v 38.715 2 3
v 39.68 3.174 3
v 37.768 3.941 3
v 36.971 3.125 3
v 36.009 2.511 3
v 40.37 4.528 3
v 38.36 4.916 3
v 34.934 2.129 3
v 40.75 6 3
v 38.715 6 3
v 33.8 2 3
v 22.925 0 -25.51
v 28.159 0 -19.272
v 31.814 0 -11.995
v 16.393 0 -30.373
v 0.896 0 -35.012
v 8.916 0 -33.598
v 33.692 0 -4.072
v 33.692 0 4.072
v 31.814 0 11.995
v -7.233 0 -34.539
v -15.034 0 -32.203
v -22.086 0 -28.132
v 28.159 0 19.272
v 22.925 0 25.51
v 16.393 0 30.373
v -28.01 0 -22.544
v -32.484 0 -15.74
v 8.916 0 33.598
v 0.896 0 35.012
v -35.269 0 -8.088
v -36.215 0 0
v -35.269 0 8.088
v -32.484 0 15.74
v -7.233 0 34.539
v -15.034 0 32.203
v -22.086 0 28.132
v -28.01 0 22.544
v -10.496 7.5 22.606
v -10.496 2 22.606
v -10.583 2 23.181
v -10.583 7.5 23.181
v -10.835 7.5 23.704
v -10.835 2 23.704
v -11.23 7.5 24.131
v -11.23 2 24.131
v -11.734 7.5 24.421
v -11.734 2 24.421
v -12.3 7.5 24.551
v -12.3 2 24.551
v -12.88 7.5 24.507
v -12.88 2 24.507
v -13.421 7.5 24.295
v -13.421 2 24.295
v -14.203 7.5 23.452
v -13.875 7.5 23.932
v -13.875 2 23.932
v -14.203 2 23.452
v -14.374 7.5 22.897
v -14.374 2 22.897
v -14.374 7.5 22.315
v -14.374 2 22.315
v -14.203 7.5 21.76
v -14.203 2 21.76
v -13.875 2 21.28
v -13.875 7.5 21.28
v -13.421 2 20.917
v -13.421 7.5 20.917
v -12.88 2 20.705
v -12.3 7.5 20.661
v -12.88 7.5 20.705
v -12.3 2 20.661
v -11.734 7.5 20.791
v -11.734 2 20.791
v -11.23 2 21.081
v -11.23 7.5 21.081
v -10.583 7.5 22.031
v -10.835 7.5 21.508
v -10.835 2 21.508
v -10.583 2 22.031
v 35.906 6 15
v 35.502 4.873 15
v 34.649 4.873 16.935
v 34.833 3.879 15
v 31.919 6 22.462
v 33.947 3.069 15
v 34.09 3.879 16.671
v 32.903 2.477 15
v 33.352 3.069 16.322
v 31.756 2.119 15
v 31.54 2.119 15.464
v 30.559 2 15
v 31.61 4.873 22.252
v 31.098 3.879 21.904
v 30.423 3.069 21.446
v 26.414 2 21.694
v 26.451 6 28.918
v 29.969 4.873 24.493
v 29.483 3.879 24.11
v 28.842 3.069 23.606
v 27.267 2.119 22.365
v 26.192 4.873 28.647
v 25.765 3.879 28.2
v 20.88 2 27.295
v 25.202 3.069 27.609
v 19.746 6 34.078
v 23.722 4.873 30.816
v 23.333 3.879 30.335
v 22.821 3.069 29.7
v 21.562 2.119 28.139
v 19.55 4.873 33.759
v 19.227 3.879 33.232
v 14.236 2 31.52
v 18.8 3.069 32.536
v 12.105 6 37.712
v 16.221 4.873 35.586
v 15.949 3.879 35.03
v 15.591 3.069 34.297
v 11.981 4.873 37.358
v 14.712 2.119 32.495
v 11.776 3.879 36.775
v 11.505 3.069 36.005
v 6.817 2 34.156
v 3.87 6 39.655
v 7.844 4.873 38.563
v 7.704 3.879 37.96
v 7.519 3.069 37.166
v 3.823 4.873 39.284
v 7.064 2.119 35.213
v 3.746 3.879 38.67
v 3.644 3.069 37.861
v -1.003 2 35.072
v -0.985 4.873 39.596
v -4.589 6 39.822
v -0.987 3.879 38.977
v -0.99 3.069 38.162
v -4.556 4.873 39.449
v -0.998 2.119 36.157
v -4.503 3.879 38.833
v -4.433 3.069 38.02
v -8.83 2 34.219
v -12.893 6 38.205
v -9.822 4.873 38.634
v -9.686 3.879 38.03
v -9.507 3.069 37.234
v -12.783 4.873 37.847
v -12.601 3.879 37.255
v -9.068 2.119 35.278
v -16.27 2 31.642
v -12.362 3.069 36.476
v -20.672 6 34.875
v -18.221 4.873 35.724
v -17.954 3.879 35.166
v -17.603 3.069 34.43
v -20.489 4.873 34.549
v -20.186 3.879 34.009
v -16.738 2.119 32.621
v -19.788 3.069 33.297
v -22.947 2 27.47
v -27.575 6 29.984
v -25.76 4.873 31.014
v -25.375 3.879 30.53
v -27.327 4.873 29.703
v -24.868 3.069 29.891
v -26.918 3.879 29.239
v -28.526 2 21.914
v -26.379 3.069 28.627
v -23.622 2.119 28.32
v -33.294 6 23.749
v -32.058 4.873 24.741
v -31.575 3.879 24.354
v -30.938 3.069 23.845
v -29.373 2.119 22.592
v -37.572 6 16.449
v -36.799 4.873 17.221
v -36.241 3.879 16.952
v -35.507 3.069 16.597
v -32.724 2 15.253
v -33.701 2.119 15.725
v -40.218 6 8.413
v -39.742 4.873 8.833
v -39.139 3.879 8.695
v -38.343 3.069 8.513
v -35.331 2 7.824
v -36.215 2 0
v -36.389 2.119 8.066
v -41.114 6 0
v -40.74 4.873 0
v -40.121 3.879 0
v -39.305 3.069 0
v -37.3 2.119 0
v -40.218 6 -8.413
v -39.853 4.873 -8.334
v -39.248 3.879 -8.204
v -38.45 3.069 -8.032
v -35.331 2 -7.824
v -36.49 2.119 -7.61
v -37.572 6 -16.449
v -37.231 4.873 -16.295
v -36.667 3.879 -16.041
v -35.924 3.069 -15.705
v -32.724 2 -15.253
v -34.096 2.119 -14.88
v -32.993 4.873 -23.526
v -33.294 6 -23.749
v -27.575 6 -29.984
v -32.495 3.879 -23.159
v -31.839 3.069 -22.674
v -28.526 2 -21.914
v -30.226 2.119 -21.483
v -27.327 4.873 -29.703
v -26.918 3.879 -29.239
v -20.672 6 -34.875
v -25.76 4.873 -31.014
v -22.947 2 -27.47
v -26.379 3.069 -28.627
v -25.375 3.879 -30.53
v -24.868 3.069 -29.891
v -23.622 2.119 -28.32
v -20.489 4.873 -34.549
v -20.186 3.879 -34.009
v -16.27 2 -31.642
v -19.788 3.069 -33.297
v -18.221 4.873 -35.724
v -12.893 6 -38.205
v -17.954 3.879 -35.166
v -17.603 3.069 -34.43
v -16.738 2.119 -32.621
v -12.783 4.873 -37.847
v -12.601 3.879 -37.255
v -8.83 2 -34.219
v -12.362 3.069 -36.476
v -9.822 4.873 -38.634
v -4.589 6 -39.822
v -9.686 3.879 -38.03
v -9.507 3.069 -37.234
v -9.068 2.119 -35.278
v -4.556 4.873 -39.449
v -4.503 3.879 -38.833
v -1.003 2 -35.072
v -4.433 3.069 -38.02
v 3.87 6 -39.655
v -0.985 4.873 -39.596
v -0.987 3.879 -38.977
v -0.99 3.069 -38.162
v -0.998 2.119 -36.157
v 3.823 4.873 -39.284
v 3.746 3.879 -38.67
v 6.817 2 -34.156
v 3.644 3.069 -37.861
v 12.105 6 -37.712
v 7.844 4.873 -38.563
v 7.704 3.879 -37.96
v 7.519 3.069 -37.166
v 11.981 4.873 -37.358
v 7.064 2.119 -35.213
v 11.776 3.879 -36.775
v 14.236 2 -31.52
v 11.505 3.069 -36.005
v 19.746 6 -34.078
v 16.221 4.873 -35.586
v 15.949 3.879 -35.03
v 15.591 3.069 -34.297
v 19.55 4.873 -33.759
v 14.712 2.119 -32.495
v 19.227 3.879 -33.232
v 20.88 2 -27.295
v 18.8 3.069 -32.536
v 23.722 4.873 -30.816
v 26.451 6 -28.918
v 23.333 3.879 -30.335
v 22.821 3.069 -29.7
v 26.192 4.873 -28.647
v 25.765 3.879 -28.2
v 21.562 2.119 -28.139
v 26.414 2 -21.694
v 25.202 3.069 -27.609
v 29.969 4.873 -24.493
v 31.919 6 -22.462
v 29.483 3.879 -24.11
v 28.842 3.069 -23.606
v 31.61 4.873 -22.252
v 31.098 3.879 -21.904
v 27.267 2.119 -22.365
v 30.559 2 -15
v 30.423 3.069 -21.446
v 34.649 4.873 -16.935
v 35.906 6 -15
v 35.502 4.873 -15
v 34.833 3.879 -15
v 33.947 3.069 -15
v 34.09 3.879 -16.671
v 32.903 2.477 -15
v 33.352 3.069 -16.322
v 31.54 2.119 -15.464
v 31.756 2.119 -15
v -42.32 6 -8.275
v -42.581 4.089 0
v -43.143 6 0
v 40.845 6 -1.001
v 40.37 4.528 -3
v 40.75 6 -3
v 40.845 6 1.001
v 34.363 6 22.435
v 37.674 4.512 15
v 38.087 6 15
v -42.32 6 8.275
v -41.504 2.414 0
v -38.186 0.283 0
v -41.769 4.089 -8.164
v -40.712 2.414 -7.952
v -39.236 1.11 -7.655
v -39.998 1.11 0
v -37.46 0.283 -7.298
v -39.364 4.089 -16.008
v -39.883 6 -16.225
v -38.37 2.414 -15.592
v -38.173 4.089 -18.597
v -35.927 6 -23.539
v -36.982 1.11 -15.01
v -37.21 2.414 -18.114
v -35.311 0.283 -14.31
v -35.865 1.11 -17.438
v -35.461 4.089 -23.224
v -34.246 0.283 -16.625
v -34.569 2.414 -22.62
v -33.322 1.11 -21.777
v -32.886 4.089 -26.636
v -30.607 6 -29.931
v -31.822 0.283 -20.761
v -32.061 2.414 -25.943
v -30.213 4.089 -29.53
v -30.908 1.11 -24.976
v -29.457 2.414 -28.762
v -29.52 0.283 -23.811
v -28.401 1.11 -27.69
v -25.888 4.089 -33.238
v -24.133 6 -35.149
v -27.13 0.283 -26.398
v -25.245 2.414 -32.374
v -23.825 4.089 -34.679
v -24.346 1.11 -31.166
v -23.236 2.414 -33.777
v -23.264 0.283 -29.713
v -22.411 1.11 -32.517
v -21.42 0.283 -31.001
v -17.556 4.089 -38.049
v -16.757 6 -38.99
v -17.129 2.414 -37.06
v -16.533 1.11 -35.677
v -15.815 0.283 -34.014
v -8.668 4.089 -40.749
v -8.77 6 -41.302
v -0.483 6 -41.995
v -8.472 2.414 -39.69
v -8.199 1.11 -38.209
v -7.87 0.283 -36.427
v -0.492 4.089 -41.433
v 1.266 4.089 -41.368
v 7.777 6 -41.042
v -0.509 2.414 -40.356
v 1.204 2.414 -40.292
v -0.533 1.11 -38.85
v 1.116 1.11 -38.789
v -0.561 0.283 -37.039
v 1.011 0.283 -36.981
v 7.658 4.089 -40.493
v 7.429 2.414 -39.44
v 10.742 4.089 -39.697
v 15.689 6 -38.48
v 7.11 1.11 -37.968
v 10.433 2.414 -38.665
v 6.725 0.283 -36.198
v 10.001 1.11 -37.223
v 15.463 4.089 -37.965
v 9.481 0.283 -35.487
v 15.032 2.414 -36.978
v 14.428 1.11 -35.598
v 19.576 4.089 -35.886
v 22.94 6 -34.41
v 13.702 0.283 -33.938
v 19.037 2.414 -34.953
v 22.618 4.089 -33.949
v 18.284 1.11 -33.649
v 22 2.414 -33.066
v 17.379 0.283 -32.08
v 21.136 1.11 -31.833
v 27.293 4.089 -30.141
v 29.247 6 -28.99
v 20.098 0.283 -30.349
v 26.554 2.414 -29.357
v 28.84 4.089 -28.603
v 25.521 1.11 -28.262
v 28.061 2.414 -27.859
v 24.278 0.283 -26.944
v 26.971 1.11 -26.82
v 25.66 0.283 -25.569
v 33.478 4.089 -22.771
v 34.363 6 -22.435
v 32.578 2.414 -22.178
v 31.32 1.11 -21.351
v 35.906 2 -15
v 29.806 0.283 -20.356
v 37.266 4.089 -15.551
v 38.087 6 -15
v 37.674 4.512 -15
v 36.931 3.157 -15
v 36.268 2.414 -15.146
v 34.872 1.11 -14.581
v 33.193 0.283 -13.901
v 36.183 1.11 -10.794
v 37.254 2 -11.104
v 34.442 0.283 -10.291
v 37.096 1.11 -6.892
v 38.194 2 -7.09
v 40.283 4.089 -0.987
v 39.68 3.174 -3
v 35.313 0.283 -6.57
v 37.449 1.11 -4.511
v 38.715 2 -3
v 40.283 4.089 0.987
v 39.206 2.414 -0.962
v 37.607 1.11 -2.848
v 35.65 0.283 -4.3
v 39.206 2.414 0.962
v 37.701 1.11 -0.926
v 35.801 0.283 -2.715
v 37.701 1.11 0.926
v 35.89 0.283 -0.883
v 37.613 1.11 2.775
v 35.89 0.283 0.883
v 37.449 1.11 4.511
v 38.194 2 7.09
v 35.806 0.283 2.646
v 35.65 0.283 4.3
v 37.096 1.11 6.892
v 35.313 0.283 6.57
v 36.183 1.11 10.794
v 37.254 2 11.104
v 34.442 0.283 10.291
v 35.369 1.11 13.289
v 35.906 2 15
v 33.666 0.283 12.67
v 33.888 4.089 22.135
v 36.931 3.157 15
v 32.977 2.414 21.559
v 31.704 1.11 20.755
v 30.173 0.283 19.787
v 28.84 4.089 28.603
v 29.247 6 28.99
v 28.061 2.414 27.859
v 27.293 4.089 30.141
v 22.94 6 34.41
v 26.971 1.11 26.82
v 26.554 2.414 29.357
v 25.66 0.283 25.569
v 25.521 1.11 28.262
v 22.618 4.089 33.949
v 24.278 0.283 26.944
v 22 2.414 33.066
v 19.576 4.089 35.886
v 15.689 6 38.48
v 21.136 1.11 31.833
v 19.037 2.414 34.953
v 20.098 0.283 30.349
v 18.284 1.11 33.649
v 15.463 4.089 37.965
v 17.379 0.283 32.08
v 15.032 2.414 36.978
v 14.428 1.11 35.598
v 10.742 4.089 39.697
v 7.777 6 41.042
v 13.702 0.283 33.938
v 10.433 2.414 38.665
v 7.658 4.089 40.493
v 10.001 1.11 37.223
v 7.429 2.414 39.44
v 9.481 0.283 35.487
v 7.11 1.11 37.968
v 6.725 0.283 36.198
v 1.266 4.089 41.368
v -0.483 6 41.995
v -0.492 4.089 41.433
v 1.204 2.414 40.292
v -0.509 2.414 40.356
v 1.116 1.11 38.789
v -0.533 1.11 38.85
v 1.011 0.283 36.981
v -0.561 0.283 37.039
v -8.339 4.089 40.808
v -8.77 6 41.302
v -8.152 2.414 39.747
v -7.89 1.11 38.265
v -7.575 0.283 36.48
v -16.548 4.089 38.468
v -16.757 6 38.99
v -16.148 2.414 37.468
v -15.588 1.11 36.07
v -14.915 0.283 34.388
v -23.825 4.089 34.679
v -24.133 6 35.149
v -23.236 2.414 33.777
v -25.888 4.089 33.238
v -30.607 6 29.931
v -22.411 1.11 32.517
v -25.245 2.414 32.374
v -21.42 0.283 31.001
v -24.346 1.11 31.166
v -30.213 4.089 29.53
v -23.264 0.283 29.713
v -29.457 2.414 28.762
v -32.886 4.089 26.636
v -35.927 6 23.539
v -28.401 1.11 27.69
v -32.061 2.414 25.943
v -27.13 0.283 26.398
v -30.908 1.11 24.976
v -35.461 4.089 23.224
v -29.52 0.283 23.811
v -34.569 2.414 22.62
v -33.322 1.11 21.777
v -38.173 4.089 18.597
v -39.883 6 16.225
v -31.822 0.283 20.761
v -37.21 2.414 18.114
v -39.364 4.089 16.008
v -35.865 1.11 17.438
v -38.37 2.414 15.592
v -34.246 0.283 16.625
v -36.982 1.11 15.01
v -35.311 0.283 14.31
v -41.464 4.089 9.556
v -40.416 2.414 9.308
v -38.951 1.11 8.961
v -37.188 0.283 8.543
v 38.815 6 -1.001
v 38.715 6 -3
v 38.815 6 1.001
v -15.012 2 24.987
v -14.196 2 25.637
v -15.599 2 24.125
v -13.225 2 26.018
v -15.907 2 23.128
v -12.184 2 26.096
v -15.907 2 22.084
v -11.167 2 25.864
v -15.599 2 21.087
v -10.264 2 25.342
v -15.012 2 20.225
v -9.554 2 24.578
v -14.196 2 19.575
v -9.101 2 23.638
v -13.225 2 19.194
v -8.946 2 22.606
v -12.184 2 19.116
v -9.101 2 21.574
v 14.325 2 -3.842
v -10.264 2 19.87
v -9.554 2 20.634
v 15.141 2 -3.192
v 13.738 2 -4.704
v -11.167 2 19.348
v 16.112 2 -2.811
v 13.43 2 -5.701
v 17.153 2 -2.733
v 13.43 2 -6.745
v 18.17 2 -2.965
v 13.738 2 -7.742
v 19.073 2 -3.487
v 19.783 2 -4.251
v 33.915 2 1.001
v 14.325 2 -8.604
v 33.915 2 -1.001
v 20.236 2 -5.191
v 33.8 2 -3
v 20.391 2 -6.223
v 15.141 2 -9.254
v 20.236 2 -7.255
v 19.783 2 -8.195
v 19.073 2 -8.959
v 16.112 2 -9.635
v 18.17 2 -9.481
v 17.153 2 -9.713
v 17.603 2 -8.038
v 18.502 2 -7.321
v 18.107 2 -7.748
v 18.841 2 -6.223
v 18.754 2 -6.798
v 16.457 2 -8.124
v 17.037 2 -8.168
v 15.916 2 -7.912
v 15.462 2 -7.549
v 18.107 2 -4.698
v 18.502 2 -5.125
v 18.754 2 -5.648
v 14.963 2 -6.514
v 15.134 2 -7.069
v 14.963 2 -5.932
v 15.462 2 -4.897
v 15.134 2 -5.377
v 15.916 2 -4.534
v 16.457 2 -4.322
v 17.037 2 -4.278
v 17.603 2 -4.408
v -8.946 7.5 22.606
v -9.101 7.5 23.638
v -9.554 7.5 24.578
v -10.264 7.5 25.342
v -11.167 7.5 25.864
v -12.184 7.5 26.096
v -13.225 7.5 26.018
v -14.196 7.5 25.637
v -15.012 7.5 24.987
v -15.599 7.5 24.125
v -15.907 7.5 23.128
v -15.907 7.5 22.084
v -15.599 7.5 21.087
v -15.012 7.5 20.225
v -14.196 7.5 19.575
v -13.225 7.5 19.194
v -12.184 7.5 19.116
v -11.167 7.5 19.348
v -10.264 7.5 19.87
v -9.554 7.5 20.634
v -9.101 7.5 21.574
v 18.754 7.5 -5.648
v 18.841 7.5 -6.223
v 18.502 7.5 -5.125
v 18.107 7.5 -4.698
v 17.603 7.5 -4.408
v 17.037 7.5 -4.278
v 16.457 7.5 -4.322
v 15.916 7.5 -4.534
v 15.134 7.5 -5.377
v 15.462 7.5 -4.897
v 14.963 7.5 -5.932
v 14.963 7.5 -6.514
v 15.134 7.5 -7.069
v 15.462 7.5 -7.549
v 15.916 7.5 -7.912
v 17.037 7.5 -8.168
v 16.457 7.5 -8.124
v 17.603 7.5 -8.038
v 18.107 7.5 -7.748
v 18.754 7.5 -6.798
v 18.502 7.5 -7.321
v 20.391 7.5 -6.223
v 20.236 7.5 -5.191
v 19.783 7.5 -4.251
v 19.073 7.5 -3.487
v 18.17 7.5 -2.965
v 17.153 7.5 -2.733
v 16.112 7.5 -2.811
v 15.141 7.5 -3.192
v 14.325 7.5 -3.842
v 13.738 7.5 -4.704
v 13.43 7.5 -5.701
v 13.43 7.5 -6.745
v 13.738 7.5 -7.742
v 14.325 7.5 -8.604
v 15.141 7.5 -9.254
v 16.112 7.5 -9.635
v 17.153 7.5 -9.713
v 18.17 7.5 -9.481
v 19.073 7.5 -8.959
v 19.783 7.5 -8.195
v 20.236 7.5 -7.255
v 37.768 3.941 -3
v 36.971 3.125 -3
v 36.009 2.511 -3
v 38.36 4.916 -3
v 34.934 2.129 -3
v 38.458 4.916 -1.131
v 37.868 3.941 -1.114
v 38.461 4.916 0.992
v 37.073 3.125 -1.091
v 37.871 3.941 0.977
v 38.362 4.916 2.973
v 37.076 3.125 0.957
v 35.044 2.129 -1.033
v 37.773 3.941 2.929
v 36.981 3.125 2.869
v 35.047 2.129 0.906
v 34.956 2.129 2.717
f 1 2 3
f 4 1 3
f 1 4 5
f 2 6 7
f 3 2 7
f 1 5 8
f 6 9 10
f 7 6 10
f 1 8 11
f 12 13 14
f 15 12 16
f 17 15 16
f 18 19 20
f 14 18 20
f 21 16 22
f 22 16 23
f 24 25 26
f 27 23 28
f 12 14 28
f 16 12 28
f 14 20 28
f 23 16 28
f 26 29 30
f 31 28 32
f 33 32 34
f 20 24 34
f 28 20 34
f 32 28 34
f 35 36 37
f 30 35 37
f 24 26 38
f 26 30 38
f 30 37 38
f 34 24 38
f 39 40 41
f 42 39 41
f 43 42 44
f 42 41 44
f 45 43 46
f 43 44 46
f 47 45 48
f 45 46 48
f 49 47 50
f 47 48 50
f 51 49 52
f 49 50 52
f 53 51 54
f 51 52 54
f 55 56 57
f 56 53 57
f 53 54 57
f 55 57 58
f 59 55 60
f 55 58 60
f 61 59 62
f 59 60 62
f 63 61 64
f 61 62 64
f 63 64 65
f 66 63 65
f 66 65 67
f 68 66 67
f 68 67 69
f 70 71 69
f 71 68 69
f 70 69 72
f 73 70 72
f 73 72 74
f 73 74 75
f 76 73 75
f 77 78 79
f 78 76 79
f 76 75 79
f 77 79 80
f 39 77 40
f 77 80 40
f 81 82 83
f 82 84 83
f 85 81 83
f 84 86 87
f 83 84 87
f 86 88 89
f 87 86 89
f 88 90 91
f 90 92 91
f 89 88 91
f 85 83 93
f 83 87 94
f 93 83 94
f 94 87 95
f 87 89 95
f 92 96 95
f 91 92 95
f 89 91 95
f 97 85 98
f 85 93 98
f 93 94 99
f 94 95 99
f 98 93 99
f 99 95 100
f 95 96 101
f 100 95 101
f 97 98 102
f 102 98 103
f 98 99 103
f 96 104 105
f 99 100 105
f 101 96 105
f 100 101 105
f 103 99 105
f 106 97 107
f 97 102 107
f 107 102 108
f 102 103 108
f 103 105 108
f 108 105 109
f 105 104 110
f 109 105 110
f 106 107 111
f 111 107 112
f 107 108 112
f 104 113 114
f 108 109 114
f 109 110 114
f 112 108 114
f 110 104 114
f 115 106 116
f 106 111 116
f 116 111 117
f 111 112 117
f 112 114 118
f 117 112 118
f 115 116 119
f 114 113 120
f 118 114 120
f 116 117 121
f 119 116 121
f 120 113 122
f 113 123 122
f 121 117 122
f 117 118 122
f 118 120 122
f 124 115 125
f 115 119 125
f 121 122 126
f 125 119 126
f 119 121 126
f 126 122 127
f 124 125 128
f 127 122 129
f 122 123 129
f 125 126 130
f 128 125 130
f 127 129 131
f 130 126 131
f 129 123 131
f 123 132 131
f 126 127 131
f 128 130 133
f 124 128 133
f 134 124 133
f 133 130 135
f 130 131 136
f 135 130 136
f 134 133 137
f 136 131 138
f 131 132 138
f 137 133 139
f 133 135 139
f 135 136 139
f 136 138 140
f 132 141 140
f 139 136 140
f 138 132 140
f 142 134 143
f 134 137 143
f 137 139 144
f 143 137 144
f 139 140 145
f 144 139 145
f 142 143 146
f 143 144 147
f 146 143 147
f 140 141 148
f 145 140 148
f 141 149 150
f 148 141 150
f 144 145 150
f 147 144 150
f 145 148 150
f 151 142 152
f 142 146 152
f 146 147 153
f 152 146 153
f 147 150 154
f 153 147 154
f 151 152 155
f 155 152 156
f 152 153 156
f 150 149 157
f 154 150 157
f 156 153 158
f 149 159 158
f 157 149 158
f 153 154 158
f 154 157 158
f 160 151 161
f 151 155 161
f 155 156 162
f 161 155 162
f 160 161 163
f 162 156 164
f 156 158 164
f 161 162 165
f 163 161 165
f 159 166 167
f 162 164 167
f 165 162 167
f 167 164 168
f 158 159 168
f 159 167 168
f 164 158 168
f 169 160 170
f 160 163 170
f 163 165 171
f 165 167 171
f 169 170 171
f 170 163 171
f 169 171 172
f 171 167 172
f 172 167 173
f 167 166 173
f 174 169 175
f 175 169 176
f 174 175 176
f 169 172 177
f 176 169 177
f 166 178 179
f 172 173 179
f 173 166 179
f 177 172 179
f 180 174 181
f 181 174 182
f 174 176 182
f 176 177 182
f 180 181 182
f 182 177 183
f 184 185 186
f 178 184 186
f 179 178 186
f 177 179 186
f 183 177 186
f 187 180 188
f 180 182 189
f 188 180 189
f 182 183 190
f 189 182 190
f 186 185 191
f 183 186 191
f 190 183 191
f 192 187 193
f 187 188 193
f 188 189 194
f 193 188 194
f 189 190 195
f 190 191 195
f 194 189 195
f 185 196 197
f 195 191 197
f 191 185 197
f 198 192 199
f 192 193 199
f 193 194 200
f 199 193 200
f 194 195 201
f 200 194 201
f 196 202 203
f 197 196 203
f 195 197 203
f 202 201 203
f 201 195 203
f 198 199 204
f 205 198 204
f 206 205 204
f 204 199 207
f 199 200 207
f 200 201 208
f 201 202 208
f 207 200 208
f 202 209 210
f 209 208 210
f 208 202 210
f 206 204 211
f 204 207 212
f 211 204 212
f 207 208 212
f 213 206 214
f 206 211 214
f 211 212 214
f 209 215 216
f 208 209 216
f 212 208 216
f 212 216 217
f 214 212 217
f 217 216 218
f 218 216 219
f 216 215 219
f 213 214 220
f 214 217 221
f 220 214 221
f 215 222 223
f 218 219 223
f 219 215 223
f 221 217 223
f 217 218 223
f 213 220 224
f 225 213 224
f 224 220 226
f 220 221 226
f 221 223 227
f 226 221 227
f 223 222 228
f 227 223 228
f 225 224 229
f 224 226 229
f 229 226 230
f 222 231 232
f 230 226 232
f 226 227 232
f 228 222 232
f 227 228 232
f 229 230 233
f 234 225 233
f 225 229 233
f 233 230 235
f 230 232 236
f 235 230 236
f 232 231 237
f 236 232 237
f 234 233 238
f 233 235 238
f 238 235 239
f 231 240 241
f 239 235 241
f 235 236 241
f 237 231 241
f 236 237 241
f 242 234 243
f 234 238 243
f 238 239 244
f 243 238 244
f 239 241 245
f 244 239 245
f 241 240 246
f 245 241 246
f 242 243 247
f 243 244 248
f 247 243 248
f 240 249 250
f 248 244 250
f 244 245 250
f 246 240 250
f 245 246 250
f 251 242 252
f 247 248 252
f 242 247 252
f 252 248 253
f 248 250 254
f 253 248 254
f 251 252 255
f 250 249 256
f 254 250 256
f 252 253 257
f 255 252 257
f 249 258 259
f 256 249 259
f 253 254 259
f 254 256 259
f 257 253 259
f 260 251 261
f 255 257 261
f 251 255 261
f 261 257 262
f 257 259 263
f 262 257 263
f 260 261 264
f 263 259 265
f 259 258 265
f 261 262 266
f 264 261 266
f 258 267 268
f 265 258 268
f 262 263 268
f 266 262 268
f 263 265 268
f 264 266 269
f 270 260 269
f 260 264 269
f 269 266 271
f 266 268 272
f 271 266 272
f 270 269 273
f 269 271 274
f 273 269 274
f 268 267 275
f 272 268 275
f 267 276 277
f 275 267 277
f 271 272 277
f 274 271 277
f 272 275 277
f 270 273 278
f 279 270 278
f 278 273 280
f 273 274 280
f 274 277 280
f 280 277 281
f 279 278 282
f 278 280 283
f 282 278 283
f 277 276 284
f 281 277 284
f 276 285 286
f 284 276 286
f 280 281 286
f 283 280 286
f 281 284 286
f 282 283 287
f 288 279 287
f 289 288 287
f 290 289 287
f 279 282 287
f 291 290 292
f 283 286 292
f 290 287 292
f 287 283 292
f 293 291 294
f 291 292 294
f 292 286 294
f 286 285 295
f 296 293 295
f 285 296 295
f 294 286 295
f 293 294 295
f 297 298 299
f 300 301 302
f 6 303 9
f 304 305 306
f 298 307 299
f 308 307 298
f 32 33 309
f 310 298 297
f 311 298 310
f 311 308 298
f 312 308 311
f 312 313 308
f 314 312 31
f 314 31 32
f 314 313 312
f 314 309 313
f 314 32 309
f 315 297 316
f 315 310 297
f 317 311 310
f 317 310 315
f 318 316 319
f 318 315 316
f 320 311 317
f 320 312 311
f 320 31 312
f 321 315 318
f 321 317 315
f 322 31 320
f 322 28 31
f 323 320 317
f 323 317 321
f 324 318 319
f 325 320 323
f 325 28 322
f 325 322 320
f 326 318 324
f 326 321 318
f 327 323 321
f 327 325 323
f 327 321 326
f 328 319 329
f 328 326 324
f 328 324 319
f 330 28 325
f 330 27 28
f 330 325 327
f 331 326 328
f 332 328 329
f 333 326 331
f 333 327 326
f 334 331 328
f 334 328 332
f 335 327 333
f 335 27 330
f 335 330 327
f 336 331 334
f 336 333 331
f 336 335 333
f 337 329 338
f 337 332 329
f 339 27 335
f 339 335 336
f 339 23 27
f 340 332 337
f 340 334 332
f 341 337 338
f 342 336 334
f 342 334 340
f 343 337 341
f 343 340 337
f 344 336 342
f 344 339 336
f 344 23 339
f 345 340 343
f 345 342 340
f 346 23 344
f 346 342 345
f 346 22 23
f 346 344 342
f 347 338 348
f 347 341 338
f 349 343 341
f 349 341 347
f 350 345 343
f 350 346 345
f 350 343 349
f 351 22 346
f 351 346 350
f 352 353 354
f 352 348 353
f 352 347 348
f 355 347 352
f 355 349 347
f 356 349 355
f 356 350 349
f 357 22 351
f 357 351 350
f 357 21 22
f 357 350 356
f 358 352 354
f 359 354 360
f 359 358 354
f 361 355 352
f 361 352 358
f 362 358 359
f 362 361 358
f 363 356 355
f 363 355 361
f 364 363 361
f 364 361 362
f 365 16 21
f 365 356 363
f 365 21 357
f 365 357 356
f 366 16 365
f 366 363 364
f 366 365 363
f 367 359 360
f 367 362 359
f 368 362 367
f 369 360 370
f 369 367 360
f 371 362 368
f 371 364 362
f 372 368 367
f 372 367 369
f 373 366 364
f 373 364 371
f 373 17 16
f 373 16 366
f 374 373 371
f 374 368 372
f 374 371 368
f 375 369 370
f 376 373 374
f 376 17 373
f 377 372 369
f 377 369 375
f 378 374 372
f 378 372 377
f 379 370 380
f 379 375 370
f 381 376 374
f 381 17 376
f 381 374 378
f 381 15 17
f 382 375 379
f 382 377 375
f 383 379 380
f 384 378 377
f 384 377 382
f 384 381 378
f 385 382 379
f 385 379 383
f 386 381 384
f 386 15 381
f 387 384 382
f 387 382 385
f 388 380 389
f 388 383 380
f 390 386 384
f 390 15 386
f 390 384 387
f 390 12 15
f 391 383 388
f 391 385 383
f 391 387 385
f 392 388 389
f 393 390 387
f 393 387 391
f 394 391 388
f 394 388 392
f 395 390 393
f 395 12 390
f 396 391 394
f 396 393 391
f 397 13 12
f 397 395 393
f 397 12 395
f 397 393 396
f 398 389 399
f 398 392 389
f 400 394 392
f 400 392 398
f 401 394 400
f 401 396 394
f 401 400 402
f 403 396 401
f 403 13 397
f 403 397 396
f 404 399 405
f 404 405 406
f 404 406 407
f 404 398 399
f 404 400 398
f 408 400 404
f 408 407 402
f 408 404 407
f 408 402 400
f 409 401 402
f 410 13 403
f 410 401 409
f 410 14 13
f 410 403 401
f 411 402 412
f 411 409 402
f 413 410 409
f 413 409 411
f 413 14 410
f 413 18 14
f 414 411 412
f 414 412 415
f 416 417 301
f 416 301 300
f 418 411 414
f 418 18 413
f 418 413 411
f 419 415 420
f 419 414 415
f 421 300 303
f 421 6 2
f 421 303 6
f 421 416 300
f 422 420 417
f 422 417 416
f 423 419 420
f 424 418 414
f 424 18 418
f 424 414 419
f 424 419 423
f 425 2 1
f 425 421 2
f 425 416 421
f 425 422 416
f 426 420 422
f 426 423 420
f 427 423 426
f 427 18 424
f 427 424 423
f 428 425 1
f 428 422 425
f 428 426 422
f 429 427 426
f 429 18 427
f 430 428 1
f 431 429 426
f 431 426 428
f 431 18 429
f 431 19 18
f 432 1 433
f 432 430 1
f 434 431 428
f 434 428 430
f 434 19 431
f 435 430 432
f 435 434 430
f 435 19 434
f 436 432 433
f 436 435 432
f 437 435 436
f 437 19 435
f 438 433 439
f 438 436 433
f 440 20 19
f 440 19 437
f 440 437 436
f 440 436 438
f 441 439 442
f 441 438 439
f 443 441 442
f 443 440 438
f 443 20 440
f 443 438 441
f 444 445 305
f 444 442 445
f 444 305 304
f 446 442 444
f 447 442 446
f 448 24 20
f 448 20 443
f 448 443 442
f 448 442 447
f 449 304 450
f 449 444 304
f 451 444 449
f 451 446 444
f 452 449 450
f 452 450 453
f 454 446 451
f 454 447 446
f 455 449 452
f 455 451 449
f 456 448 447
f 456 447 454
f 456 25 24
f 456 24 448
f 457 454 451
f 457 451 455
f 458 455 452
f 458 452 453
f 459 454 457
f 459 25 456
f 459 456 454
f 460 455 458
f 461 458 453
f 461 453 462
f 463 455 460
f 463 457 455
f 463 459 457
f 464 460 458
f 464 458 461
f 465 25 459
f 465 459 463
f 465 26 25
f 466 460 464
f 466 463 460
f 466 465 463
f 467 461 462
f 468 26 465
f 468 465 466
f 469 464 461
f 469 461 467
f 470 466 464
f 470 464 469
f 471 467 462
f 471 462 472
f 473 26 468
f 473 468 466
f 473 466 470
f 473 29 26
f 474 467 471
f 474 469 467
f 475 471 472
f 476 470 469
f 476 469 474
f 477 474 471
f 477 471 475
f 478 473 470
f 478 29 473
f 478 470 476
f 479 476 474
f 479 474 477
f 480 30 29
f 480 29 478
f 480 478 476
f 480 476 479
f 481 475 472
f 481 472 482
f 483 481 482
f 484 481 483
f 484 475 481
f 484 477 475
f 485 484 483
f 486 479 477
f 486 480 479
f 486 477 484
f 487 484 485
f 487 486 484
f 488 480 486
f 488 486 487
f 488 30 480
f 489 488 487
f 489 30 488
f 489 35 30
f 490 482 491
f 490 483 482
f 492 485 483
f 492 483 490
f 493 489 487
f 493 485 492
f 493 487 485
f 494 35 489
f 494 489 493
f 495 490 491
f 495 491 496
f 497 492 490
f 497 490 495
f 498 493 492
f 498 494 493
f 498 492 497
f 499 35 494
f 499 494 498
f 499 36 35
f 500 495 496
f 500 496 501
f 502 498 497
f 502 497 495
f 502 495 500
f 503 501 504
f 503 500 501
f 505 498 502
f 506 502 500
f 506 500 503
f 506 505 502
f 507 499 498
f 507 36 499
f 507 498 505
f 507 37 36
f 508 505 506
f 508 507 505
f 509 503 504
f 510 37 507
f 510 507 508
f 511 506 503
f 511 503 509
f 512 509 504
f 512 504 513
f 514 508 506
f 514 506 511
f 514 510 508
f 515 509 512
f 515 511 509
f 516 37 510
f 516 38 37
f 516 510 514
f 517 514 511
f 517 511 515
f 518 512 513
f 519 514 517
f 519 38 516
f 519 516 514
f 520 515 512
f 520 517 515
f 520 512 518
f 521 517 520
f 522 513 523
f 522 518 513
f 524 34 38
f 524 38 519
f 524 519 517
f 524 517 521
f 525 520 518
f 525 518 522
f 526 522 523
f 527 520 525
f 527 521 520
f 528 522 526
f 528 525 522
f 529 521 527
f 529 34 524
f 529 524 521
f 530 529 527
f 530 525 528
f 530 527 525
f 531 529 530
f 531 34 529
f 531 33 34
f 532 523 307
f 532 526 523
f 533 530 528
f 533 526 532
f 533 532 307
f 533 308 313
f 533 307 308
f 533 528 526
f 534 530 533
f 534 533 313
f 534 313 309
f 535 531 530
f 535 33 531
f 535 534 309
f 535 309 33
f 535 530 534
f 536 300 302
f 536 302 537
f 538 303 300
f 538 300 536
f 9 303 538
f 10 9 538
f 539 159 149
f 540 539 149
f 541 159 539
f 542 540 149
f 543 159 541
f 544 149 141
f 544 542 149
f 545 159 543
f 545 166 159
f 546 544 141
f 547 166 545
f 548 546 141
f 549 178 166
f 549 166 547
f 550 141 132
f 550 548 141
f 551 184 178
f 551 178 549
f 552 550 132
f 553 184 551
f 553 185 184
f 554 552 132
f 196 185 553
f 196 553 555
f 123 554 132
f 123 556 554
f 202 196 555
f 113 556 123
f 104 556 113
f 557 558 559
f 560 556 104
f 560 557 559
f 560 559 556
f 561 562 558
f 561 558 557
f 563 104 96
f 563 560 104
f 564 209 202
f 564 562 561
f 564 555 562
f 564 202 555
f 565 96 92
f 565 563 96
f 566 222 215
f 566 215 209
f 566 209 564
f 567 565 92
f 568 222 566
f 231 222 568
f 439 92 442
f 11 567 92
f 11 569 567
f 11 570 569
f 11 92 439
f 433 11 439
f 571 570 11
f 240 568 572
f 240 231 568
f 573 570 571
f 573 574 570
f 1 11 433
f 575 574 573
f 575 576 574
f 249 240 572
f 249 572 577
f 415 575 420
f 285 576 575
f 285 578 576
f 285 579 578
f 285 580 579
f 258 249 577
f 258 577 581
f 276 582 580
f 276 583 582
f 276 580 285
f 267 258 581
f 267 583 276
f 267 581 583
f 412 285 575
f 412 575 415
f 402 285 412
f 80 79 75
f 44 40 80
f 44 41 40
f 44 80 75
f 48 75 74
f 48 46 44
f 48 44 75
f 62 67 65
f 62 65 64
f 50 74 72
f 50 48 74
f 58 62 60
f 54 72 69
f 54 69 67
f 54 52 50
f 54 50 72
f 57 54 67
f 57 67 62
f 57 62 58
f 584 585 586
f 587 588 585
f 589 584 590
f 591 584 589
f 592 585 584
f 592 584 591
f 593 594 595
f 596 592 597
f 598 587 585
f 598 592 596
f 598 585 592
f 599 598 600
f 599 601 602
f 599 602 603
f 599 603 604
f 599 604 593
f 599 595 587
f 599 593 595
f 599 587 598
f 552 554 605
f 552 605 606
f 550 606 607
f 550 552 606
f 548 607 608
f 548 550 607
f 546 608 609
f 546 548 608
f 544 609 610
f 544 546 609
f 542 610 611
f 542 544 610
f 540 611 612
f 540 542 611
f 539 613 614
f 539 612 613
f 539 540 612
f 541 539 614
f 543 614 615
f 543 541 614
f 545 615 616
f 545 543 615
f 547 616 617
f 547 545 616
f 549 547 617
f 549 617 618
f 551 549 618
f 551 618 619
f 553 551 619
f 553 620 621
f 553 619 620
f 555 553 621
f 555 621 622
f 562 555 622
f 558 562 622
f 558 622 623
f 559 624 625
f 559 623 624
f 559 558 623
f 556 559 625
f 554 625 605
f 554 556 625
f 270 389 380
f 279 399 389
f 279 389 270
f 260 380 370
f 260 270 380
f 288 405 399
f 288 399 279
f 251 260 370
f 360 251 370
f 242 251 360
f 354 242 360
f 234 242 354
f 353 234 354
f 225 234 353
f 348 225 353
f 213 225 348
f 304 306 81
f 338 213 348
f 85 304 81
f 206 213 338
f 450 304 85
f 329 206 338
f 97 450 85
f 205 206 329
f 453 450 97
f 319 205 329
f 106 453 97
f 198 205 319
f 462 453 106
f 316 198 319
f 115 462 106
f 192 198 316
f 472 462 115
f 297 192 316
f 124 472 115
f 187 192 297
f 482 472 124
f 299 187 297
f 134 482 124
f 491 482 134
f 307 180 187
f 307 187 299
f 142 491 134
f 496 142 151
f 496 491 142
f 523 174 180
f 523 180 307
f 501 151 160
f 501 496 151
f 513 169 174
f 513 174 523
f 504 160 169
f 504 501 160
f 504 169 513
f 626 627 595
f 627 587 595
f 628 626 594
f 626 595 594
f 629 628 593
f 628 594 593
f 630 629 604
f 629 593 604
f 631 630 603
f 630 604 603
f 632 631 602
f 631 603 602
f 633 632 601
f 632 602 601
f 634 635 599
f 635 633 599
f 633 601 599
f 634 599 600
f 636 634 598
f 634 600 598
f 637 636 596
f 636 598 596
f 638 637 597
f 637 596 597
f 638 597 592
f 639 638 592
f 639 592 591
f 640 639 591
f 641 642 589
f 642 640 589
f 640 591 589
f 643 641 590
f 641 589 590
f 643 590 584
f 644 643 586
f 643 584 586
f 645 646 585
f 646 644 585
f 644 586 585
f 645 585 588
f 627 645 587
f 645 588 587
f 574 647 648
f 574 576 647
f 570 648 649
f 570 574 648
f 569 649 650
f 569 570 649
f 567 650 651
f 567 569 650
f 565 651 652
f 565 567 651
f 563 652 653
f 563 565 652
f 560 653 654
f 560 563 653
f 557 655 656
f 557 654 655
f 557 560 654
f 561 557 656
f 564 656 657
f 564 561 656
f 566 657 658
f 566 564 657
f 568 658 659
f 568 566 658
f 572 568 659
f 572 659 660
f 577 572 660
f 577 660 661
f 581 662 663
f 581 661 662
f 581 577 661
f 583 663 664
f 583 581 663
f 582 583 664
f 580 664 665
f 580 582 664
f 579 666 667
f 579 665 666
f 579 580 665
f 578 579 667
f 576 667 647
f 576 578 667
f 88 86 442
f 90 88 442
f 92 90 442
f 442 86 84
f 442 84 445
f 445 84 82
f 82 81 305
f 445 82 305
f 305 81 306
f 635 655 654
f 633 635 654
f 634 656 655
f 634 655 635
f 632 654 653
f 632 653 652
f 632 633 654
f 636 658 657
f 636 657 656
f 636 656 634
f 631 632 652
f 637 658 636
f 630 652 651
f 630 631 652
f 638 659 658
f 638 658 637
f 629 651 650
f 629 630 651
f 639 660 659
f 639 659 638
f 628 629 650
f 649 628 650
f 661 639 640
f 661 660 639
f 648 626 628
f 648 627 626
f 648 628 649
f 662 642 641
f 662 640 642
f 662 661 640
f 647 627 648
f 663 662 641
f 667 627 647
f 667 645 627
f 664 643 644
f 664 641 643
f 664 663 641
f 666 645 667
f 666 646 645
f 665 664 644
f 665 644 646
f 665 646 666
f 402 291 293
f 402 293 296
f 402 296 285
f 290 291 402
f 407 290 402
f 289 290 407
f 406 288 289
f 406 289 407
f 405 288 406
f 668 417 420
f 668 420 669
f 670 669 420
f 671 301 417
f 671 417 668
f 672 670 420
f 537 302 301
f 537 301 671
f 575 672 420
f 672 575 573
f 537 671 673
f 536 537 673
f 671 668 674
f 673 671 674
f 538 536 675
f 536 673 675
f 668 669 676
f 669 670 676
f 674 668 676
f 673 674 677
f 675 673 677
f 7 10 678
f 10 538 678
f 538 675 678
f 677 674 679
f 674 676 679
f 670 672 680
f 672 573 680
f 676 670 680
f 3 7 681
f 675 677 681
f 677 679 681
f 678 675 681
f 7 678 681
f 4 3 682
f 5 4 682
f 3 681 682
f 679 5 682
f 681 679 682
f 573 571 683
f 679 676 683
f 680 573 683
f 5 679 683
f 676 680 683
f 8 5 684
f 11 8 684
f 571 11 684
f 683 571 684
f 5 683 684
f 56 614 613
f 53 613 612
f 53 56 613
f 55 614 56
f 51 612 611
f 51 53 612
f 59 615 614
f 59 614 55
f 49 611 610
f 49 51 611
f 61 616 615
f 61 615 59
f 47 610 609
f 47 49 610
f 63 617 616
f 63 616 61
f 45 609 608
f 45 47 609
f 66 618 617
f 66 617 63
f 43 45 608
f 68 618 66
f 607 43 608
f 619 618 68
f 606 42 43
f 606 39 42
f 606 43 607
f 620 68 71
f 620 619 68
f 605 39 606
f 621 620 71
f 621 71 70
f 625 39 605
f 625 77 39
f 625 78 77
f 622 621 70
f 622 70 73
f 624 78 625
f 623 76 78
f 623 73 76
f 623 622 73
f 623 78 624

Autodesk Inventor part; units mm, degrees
ref_plane "YZ Plane" through (0, 0, 0) normal (1, 0, 0) x (0, 1, 0)
ref_plane "XZ Plane" through (0, 0, 0) normal (0, 1, 0) x (-1, 0, 0)
ref_plane "XY Plane" through (0, 0, 0) normal (0, 0, 1) x (1, 0, 0)
sketch "Sketch1" plane through (0, 0, 0) normal (0, 1, 0) x (-1, 0, 0)
  circle A0 centre (1.143, 0) radius 39 construction
  circle A1 centre (1.143, 0) radius 42
  line L0 (-21.857, 14) -> (-36.857, 14) construction
  line L1 (-36.857, 14) -> (-36.857, 5) construction
  line L2 (-36.857, 5) -> (-21.857, 5) construction
  line L3 (-21.857, 5) -> (-21.857, 14) construction
  line L4 (1.143, 0) -> (-37.857, 0)
  line L5 (0, 0) -> (0, -22) construction
  dimension "d0" = 78
  dimension "d1" = 9
  dimension "d2" = 15
  dimension "d3" = 5
  dimension "d4" = 23
  dimension "d5" = 84
  dimension "d11" = 1.143
extrude "Extrusion1" add sketch "Sketch1" along normal blind 6
fillet "Fillet1" radius 7 1 edges at (40.857, 0, 0)
shell "Shell1" thickness 2 removed faces 1 at (-4.0377, 6, 12.235)
sketch "Sketch2" plane through (-1.143, 2, 0) normal (0, 1, 0) x (1, 0, 0)
  circle A0 centre (-11.303, -22.606) radius 1.95
  circle A1 centre (18.034, 6.223) radius 1.95
  circle A2 centre (-11.303, -22.606) radius 3.5
  circle A3 centre (18.034, 6.223) radius 3.5
  point P0 (1.143, 0)
  dimension "d12" = 3.9
  dimension "d13" = 3.9
  dimension "d14" = 6.223
  dimension "d15" = 16.891
  dimension "d16" = 22.606
  dimension "d17" = 12.446
  dimension "d18" = 7
  dimension "d19" = 7
extrude "Extrusion2" add sketch "Sketch2" along normal blind 5.5
sketch "Sketch3" plane through (-1.143, 2, 0) normal (0, 1, 0) x (1, 0, 0)
  line L0 (7.5, 19.5) -> (-25.5, 19.5) construction
  line L1 (-25.5, 19.5) -> (-25.5, -9.5) construction
  line L2 (-25.5, -9.5) -> (7.5, -9.5) construction
  line L3 (7.5, -9.5) -> (7.5, 19.5) construction
  line L4 (7.5, 19.5) -> (-25.5, -9.5) construction
  line L5 (-25.5, 19.5) -> (7.5, -9.5) construction
  point P0 (1.143, 0)
  point P1 (-9, 5)
  dimension "d22" = 33
  dimension "d23" = 29
sketch "Sketch5" plane through (-1.143, 6, 0) normal (0, 1, 0) x (1, 0, 0)
  line L0 (31.143, -15) -> (45, -15)
  line L1 (45, -15) -> (45, -3)
  line L2 (45, -3) -> (31.143, -3)
  line L3 (31.143, -3) -> (31.143, -15)
  line L4 (1.143, 0) -> (-32, 0) construction
  line L5 (31.143, 15) -> (45, 15)
  line L6 (45, 15) -> (45, 3)
  line L7 (45, 3) -> (31.143, 3)
  line L8 (31.143, 3) -> (31.143, 15)
  dimension "d24" = 3
  dimension "d25" = 12
  dimension "d26" = 30
extrude "Extrusion3" cut sketch "Sketch5" against normal up to surface (4 mm away)
properties part number "Case bottom"
